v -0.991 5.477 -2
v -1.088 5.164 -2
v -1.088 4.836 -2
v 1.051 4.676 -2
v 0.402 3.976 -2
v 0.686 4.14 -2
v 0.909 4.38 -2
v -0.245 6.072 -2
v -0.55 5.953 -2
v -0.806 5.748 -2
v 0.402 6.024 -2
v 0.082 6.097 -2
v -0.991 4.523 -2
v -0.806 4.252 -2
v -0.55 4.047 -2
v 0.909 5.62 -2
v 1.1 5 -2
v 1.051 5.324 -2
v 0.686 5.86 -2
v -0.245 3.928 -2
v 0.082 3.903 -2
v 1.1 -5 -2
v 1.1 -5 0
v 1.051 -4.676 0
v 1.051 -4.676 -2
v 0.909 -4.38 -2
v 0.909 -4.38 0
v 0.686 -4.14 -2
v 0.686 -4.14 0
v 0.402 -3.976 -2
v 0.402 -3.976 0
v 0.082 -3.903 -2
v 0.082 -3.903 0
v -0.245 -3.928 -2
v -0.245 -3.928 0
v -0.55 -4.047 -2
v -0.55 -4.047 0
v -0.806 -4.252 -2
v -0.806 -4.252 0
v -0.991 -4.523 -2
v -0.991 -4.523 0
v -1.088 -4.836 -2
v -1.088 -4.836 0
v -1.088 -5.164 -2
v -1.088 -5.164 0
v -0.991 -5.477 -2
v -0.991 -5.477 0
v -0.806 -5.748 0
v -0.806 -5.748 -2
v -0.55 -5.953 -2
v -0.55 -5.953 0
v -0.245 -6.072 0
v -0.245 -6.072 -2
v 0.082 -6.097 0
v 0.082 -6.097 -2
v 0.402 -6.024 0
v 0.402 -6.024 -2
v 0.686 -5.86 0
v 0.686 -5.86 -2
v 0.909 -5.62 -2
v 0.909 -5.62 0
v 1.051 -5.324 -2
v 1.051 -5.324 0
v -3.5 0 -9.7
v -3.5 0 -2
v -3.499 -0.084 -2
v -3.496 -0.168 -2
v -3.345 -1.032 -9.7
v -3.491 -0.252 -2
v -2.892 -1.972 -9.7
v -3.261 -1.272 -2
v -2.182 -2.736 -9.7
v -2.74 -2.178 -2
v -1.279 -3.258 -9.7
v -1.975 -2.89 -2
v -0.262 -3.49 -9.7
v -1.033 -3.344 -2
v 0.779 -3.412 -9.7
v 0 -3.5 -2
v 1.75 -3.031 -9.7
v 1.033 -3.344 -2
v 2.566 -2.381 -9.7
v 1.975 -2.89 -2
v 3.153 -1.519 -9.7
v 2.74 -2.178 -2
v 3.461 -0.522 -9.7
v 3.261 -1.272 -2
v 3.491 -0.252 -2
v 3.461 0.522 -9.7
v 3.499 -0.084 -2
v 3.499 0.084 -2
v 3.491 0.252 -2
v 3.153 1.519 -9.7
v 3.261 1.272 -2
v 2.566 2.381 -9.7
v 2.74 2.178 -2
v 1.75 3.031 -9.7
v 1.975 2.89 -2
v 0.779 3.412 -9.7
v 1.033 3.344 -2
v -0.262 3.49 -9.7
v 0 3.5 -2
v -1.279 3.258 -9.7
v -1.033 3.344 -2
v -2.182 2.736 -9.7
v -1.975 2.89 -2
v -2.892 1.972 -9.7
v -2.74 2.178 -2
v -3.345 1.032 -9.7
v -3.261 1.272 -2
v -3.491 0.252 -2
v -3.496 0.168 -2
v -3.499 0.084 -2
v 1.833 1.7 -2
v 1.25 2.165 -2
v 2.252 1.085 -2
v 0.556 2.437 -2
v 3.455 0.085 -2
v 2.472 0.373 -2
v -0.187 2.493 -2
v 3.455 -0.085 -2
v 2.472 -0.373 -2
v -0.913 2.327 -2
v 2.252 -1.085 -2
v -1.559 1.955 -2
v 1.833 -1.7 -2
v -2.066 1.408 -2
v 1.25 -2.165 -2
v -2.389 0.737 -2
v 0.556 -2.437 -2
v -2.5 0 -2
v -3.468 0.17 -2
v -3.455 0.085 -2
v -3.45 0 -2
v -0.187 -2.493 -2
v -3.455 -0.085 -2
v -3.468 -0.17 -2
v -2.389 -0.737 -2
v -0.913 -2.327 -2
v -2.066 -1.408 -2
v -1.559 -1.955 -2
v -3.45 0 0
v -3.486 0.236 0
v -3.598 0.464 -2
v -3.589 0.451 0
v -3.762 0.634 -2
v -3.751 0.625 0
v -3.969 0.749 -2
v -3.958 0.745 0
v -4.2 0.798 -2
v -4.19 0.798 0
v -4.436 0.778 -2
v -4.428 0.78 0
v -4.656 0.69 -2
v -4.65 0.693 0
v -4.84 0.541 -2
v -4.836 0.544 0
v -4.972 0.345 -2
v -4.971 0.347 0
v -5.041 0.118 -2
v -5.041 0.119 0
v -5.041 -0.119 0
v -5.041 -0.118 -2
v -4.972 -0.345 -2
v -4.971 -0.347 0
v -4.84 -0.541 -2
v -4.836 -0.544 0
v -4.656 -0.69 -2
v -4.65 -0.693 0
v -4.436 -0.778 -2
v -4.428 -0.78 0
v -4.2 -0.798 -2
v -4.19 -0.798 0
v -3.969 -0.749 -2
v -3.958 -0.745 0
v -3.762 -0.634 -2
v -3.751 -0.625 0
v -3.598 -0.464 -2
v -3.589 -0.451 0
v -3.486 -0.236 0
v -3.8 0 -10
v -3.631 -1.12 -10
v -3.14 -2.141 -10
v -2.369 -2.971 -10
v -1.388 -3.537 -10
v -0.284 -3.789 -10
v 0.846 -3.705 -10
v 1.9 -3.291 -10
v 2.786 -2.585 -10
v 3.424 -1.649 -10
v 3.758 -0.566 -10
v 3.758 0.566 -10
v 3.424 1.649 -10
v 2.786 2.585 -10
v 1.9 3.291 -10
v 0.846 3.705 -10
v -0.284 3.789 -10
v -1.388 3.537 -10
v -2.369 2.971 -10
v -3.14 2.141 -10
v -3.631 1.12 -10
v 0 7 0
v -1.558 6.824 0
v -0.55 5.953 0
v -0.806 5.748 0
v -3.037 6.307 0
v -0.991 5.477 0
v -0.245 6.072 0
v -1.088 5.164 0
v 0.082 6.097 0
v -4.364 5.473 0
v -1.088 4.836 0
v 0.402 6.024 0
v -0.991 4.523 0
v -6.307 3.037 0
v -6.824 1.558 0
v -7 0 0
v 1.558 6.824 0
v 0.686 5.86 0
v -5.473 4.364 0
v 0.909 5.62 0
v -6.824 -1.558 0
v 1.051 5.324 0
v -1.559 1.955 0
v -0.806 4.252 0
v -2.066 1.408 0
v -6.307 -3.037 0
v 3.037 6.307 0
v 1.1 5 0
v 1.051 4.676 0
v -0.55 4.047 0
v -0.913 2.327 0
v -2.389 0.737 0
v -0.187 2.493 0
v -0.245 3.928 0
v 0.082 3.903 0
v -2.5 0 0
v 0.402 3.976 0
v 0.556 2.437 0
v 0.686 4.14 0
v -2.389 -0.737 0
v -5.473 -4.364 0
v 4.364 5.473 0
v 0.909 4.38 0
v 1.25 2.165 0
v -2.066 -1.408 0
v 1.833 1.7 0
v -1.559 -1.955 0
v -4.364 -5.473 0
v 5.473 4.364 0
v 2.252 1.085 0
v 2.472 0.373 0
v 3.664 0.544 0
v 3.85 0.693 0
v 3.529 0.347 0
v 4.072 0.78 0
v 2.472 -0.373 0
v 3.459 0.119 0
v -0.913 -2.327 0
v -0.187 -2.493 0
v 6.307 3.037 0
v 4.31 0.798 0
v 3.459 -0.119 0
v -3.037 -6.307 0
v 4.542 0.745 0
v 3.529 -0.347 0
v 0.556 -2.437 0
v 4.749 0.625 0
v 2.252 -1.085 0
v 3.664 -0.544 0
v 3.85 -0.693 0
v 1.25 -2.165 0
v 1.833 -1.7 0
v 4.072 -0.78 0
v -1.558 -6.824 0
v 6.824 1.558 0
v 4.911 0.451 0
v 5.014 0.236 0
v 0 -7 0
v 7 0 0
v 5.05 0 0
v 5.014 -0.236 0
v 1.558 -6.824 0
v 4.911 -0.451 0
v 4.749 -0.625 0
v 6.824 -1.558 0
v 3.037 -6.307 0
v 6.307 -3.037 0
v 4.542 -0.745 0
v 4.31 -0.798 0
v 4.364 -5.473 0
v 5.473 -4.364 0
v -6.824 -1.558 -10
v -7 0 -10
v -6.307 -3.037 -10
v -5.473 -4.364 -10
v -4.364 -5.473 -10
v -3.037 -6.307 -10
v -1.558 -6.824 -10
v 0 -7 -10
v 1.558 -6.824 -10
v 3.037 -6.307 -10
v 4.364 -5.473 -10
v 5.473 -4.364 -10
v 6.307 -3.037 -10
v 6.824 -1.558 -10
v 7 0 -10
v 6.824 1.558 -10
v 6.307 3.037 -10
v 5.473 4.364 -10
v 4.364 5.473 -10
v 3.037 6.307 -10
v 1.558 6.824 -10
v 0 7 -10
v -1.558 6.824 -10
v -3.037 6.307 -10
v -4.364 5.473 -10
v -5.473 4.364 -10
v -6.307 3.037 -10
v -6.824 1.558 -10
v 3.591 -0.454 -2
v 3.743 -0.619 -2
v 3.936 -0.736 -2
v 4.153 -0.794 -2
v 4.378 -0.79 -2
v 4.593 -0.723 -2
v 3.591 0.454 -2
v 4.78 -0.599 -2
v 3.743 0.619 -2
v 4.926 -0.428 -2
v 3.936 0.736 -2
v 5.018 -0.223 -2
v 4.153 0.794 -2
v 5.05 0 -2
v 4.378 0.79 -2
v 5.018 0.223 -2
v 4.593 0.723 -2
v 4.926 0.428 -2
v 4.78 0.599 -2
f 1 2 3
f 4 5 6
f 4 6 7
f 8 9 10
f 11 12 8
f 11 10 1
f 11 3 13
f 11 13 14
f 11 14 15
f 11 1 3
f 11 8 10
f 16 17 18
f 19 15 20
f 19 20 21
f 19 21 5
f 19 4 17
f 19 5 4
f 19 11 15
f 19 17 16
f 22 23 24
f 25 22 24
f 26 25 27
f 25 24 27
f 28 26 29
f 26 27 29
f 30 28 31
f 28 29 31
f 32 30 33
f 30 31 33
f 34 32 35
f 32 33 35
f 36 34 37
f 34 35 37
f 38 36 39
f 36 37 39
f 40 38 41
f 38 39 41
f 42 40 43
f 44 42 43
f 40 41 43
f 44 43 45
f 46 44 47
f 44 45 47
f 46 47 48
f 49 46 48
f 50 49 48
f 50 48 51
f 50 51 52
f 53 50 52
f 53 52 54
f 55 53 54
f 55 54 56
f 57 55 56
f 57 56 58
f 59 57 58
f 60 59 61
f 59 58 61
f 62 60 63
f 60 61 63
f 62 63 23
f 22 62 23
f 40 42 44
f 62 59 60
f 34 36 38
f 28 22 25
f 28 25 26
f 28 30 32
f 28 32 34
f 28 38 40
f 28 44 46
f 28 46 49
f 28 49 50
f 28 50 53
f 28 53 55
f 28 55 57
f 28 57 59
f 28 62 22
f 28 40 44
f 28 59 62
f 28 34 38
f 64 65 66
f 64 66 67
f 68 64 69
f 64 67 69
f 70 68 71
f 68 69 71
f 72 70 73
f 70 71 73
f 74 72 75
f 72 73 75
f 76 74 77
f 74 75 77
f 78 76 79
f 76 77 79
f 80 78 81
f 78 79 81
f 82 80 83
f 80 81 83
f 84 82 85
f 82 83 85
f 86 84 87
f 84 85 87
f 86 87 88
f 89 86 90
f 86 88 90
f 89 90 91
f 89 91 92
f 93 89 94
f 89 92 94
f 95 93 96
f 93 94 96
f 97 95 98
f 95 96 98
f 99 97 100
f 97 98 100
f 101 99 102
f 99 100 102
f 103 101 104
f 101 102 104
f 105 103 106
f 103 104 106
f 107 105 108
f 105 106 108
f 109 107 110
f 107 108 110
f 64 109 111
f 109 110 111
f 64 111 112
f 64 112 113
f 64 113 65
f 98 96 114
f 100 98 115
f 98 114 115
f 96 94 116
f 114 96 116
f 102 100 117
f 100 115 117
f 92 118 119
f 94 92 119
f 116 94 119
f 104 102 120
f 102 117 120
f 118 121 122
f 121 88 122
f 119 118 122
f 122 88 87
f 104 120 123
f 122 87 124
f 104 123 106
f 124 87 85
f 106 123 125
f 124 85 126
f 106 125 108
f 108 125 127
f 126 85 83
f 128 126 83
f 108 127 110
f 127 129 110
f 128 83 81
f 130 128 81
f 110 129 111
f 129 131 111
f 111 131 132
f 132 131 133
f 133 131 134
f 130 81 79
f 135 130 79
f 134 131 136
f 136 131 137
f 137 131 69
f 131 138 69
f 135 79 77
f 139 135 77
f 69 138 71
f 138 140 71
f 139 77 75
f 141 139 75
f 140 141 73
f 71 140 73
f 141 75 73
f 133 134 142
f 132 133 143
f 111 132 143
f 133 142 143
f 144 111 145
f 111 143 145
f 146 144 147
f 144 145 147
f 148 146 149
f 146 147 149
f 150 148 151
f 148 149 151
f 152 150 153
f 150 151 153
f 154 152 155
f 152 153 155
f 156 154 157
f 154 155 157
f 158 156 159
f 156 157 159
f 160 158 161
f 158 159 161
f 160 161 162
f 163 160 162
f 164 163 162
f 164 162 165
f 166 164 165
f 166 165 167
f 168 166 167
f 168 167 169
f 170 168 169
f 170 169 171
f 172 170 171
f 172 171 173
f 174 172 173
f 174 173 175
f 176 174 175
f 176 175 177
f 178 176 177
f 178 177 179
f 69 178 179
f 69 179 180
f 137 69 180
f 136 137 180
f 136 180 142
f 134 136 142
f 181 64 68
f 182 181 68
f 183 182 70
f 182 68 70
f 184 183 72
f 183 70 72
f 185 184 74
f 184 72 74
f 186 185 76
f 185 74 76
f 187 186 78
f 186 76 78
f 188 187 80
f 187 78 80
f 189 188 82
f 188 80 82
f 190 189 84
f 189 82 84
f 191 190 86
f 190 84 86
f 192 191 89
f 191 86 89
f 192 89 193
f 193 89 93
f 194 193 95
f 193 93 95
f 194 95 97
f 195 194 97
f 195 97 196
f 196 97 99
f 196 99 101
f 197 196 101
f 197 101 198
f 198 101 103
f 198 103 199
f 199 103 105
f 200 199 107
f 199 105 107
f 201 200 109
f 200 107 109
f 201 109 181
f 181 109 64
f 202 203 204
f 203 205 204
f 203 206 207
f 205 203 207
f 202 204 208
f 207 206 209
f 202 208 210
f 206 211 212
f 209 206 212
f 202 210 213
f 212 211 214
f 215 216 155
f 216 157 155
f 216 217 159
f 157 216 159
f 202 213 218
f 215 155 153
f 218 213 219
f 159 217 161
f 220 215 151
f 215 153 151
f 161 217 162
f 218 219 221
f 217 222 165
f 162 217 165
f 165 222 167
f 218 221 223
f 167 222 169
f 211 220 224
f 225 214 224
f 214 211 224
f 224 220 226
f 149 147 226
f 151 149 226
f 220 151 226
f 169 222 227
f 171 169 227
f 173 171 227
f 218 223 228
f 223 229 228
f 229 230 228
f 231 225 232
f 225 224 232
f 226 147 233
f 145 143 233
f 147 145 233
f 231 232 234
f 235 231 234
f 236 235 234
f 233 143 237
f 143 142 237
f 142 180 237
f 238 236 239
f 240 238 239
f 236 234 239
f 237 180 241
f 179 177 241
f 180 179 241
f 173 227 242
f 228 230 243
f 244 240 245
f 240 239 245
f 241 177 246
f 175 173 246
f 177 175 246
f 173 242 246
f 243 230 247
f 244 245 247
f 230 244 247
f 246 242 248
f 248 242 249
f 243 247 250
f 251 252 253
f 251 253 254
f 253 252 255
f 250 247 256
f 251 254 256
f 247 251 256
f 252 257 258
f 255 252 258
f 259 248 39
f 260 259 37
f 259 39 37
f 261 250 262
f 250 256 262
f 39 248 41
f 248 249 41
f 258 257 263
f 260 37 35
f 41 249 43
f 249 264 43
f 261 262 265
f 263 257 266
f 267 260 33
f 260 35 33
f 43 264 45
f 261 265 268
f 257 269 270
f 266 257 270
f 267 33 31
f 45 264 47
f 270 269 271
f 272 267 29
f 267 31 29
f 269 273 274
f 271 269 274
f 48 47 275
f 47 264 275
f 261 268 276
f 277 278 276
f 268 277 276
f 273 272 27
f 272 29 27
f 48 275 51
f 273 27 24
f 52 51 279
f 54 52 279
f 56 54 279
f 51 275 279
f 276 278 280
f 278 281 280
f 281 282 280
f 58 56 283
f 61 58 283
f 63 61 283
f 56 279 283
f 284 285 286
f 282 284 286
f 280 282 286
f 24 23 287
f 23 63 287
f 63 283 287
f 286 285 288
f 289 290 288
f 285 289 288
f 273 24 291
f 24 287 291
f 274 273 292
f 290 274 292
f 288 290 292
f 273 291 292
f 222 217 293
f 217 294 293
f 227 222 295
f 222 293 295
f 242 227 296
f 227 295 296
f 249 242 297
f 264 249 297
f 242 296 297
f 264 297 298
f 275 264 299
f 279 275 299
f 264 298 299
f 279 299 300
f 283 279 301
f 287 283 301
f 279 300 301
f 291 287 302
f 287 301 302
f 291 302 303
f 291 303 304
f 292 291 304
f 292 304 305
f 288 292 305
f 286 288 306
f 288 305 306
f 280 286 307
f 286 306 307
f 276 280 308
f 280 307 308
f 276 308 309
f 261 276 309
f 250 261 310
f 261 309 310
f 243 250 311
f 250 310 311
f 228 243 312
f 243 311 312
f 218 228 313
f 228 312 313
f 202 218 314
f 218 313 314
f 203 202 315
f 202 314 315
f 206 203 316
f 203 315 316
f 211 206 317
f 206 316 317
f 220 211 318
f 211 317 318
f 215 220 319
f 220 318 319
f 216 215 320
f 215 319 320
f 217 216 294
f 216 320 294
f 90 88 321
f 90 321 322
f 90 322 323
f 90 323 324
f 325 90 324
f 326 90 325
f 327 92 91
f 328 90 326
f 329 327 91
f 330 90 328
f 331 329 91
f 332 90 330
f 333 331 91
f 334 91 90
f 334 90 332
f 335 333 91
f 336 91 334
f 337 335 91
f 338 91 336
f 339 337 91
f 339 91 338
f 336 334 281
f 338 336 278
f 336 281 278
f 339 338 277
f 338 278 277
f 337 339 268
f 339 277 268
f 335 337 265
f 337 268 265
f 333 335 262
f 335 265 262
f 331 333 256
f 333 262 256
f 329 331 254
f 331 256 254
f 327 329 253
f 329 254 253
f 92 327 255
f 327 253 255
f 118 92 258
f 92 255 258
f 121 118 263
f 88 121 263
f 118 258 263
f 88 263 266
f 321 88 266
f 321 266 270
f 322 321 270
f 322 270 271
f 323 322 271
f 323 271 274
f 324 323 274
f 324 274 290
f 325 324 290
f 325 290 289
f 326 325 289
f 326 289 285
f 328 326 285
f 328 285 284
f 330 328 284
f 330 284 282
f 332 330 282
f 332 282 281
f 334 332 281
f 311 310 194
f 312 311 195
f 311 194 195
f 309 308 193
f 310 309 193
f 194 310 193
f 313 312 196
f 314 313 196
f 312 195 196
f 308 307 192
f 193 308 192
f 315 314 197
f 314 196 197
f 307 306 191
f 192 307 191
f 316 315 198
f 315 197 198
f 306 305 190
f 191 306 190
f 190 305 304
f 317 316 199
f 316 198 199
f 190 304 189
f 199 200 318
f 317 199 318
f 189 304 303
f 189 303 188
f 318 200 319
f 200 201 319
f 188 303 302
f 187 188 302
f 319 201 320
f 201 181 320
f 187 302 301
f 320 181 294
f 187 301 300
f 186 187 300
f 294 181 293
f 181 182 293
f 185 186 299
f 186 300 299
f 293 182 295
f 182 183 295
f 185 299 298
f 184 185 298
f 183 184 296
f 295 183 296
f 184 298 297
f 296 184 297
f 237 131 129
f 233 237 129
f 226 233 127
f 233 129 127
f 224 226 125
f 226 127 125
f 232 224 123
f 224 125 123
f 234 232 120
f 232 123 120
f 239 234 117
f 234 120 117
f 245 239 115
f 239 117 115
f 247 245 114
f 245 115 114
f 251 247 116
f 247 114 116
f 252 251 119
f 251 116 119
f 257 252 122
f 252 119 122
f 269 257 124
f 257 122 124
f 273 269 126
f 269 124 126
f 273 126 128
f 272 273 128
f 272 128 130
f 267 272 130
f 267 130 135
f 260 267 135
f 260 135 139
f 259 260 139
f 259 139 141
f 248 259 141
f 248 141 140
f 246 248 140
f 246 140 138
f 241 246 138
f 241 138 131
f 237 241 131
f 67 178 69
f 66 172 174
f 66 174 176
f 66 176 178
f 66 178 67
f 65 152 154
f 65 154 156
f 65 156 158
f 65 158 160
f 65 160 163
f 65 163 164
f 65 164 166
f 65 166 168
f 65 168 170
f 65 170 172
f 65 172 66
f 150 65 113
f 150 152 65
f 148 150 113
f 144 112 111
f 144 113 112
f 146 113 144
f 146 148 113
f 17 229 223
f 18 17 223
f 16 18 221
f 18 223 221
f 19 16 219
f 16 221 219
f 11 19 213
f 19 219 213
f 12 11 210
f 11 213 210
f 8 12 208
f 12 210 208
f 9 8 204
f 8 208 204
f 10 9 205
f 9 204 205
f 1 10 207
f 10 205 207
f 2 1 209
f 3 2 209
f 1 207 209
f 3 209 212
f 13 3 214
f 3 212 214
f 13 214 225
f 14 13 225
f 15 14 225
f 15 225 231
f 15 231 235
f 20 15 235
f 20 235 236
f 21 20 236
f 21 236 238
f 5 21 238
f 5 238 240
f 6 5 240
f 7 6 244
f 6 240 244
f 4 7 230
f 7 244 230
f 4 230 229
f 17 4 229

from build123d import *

# Parameters (mm, degrees)
SKETCH2_R          = 2.5
CUT_EXTRUDE1_DEPTH = 13.727922061
SKETCH3_R          = 1.1
SKETCH3_R_2        = 0.8
CUT_EXTRUDE2_DEPTH = 2
CHAMFER1_SIZE      = 0.3


with BuildPart() as part:
    # Sketch1 → Revolve1 (revolve)
    with BuildSketch(Plane(origin=(0, 0, 0), x_dir=(1, 0, 0), z_dir=(0, 1, 0)), mode=Mode.PRIVATE) as revolve1_sk:
        Polygon((0, 0), (7, 0), (7, 10), (3.5, 10), (3.5, 2), (0, 2), align=None)
    revolve(revolve1_sk.sketch.rotate(Axis((0, 0, -2), (0, 0, 1)), 180), axis=Axis((0, 0, -2), (0, 0, 1)))

    # Sketch2 → Cut-Extrude1 (cut, through all)
    with BuildSketch(Plane(origin=(0, 0, -2), x_dir=(-1, 0, 0), z_dir=(0, 0, -1))):
        Circle(SKETCH2_R)
    extrude(amount=-CUT_EXTRUDE1_DEPTH, mode=Mode.SUBTRACT)

    # Sketch3 → Cut-Extrude2 (cut)
    with BuildSketch(Plane.XY):
        with Locations((0, 5)):
            Circle(SKETCH3_R)
        with Locations((0, -5)):
            Circle(SKETCH3_R)
        with Locations((4.25, 0)):
            Circle(SKETCH3_R_2)
        with Locations((-4.25, 0)):
            Circle(SKETCH3_R_2)
    extrude(amount=-CUT_EXTRUDE2_DEPTH, mode=Mode.SUBTRACT)

    # Chamfer1
    chamfer1_edges = [part.edges().sort_by_distance(p)[0] for p in [
        (3.5, 0, -10),
    ]]
    chamfer(chamfer1_edges, length=CHAMFER1_SIZE)


solid = part.part
